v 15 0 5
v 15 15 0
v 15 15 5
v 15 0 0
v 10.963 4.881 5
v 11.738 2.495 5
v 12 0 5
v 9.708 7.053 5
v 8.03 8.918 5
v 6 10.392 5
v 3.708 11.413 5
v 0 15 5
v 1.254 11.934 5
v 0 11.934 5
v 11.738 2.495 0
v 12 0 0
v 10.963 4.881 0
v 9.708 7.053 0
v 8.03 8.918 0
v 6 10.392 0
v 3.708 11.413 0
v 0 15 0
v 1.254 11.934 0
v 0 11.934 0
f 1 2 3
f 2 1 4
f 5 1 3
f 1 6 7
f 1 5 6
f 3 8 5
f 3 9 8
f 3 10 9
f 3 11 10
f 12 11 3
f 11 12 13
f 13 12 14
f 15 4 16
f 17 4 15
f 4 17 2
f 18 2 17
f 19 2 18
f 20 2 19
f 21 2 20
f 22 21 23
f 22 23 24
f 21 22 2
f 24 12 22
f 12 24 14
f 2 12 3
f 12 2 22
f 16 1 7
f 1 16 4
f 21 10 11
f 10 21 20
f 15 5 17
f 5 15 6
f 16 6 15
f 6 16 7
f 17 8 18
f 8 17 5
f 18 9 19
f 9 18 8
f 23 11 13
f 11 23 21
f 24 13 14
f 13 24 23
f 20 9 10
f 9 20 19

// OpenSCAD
// Generated by generate_scads.py
difference() {
  cube(size=[15,15,5], center=false);
  union() {
    sphere(r=12);
    cylinder(h=15, r=2, center=false);
    sphere(r=12);
  }
  cylinder(h=30, r=12, center=false);
}
